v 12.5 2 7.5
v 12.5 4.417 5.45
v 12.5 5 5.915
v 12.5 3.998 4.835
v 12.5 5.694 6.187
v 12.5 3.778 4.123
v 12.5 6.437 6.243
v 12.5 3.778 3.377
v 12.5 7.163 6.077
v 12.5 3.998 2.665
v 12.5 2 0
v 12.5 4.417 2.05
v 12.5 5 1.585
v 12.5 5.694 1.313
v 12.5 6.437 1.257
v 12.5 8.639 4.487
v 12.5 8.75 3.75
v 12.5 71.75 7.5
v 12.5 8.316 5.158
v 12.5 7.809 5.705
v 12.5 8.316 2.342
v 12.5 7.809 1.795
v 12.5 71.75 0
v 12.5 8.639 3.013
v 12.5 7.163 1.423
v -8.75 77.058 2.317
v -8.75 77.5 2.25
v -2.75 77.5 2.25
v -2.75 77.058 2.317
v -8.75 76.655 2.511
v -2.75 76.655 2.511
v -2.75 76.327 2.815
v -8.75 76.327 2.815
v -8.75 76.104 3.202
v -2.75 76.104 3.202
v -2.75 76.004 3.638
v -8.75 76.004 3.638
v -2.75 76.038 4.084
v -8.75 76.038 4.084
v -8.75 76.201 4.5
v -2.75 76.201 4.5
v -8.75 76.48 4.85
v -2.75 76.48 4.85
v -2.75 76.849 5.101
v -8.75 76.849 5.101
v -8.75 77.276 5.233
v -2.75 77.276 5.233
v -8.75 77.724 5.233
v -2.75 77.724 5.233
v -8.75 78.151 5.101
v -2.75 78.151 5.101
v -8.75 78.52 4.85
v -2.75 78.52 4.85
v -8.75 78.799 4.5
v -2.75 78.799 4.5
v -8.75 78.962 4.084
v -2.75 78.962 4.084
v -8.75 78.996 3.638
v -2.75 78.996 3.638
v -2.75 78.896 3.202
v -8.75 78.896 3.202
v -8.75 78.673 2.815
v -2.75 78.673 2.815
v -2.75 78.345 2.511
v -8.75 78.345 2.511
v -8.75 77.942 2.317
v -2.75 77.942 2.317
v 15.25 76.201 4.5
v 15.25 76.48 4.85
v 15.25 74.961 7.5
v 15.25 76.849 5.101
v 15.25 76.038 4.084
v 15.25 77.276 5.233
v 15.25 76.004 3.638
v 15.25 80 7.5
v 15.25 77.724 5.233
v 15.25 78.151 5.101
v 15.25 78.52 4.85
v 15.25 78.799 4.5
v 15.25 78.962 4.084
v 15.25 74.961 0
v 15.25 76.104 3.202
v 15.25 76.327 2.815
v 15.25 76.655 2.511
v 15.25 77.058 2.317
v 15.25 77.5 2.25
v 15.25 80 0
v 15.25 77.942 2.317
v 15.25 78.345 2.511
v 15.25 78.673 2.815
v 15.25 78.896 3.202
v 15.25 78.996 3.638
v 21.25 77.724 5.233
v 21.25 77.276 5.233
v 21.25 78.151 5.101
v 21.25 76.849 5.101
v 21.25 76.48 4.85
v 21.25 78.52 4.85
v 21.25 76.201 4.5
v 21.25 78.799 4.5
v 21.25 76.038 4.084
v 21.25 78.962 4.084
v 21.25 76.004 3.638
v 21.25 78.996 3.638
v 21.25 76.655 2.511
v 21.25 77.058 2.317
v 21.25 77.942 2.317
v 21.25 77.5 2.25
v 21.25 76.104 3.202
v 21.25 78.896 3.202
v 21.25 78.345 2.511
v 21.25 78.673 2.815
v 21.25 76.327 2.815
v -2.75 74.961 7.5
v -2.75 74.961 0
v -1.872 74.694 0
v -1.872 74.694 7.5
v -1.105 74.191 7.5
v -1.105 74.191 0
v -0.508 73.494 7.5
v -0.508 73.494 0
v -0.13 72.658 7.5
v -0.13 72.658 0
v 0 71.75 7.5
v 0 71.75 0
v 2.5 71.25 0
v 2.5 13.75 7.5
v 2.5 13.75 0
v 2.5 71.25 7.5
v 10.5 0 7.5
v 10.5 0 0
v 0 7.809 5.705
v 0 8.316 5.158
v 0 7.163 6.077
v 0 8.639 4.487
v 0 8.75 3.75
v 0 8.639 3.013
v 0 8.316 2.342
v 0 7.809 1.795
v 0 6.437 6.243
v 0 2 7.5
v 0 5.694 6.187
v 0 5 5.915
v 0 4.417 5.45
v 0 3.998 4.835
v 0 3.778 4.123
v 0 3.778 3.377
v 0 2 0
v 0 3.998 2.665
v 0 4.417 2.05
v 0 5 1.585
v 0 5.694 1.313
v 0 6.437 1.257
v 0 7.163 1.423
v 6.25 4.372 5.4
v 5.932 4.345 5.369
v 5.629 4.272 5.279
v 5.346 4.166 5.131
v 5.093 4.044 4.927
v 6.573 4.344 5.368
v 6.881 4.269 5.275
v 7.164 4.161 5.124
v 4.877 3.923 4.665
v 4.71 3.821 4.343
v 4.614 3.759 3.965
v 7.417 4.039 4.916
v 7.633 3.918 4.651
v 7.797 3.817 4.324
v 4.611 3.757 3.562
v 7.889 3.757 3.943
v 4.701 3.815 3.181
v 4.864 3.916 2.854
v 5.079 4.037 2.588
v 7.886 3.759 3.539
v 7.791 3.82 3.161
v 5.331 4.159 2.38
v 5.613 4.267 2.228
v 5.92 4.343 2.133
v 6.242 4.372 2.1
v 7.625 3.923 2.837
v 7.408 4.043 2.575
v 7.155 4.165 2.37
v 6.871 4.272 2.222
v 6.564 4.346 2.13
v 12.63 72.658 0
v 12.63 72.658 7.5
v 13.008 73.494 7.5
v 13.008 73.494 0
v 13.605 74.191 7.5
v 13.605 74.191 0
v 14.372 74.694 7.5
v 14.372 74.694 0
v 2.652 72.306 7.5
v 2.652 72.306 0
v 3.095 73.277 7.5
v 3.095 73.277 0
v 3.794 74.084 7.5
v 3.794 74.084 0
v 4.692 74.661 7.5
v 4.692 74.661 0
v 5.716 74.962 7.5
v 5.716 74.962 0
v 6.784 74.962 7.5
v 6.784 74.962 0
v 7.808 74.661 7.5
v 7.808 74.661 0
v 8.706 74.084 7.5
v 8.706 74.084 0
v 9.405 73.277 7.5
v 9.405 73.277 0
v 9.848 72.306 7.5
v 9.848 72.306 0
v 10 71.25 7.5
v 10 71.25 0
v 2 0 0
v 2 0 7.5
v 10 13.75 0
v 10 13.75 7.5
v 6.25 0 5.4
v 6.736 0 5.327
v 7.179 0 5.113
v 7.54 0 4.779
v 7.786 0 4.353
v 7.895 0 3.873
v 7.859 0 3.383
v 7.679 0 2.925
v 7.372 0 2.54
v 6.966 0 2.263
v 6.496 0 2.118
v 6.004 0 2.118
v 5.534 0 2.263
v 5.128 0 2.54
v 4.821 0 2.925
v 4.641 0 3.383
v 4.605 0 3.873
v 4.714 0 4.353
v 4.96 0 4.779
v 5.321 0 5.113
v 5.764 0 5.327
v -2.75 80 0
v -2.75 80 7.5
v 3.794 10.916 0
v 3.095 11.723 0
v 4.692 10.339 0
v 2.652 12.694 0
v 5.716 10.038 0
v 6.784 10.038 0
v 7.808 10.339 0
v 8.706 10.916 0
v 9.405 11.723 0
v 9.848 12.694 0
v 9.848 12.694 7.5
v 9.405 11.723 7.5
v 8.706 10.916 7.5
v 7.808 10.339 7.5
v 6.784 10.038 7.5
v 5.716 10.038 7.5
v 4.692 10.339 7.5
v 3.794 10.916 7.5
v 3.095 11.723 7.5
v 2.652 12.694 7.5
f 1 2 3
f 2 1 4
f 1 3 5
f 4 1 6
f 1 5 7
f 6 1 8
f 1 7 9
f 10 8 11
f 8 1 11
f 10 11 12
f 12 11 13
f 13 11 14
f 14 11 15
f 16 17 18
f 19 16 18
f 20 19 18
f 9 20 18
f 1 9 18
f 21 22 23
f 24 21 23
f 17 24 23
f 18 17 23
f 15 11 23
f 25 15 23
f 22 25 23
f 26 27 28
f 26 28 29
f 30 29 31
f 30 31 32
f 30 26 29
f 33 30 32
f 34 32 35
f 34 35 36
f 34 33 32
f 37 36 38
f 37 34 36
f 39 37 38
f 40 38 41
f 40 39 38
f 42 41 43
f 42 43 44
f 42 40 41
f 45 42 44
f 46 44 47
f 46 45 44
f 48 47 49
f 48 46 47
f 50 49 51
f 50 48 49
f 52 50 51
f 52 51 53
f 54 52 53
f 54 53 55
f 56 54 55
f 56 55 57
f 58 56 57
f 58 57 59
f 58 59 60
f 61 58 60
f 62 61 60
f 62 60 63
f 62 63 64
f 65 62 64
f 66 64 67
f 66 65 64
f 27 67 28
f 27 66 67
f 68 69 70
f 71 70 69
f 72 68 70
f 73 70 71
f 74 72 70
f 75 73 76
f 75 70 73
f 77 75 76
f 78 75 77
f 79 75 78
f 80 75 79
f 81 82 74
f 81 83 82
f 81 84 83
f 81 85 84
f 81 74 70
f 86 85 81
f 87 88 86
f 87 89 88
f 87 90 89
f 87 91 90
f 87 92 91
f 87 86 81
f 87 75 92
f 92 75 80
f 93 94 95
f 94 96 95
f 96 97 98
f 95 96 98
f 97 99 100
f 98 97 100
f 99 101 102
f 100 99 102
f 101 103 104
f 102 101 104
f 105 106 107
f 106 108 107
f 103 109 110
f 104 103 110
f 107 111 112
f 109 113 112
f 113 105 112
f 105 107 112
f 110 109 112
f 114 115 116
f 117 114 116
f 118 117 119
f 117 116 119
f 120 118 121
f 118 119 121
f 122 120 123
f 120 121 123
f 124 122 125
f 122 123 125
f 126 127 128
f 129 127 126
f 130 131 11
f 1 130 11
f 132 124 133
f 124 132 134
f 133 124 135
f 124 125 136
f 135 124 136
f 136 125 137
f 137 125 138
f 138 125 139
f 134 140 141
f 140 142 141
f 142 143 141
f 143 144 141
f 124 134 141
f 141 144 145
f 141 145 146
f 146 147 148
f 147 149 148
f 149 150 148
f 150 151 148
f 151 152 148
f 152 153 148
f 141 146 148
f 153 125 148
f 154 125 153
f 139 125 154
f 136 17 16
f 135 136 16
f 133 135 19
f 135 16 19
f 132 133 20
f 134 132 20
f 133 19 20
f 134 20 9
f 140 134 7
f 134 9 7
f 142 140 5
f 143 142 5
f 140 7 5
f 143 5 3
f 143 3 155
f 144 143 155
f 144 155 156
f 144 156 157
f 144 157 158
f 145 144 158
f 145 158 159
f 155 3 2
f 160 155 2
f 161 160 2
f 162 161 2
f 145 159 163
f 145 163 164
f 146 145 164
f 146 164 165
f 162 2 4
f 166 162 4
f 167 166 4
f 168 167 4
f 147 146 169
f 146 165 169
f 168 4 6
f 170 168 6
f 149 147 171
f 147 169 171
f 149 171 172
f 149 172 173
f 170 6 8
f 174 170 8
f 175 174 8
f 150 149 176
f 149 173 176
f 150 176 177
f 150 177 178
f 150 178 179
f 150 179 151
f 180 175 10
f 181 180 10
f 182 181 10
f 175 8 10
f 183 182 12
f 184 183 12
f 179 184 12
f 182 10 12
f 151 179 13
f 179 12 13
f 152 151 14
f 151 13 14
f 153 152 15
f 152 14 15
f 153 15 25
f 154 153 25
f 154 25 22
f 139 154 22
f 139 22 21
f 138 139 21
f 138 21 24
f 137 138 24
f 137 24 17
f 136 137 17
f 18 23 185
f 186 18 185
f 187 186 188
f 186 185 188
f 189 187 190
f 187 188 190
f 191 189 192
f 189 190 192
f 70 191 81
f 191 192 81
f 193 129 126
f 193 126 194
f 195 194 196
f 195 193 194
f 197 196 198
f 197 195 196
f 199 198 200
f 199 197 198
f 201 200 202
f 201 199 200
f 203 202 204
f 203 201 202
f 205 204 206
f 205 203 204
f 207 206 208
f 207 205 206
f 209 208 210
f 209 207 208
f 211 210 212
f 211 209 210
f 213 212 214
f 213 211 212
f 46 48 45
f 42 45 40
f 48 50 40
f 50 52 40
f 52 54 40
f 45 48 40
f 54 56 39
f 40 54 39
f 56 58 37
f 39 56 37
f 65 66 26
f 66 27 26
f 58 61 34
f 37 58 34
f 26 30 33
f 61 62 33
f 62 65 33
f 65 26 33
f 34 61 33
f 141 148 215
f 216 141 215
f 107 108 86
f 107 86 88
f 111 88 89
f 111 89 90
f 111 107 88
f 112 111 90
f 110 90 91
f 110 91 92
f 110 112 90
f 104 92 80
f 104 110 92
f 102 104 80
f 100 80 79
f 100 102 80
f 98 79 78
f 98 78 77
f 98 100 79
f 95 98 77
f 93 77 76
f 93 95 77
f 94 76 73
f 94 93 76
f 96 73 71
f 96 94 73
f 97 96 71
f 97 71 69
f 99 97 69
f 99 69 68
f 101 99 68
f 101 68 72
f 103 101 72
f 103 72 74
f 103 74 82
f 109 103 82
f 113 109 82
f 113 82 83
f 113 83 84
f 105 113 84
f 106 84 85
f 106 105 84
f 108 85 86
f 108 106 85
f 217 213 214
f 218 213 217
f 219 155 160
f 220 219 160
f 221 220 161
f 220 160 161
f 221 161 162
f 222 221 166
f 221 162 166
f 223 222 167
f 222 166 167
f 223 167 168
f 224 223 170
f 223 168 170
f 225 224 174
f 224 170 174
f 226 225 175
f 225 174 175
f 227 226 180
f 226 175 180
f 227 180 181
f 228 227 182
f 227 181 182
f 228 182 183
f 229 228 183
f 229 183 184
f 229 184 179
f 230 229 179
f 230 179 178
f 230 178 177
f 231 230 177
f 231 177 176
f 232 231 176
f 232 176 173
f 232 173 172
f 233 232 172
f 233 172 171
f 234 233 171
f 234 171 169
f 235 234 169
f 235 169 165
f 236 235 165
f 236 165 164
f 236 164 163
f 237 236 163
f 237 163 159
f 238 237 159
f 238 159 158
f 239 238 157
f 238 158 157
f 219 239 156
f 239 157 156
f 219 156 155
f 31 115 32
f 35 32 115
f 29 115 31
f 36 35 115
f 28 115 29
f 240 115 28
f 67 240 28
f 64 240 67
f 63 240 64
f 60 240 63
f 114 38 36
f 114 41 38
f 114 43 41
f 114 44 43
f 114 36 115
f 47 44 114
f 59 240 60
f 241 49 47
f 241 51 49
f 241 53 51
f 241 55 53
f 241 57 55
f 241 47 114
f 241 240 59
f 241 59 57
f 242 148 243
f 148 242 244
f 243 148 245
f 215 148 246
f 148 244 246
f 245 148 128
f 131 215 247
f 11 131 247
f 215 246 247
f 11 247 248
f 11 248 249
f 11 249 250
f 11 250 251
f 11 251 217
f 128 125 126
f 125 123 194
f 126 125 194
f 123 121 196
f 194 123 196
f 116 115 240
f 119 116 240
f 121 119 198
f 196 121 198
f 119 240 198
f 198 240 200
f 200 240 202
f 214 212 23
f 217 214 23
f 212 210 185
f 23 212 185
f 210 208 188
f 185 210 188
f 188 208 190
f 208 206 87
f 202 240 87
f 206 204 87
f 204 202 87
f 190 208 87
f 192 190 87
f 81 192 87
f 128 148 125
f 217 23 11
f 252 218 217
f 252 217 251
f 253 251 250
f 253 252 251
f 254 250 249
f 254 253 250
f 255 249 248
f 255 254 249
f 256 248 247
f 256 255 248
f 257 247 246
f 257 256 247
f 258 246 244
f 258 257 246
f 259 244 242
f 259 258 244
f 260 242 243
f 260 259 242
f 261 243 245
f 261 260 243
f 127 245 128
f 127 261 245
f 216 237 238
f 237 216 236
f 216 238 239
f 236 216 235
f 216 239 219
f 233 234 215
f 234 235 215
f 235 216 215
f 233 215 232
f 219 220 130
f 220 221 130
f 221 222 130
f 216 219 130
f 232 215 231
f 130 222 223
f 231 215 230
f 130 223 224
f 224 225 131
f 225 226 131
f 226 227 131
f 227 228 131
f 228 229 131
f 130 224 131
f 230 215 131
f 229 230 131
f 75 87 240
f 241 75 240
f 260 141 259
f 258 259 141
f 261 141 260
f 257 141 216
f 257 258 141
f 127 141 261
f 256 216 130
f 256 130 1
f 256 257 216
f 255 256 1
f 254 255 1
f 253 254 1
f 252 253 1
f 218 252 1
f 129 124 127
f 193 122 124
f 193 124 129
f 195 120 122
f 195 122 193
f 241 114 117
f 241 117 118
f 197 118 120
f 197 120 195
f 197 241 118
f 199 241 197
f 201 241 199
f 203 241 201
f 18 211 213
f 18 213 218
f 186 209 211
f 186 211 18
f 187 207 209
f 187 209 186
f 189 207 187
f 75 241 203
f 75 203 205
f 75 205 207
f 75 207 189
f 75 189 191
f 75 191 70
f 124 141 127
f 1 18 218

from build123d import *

# Parameters (mm, degrees)
AUFSATZ_LINEAR_AUSTRAGEN1_DEPTH = 7.5
SCHNITT_LINEAR_AUSTRAGEN1_DEPTH = 10
SKIZZE7_R                       = 2.5
SCHNITT_LINEAR_AUSTRAGEN4_DEPTH = 84.113251049
M4_GEWINDEBOHRUNG1_D            = 3.3
M4_GEWINDEBOHRUNG1_DEPTH        = 7.5
M4_GEWINDEBOHRUNG1_TIP          = 0.991420021
SKIZZE9_OUTSIDE_W               = 26.654
SKIZZE9_OUTSIDE_H               = 99.154
SKIZZE9_OUTSIDE_R               = 1.5
SCHNITT_LINEAR_AUSTRAGEN5_DEPTH = 6
SKIZZE10_OUTSIDE_W              = 26.654
SKIZZE10_OUTSIDE_H              = 99.154
SKIZZE10_OUTSIDE_R              = 1.5
SCHNITT_LINEAR_AUSTRAGEN6_DEPTH = 6


with BuildPart() as part:
    # Skizze1 → Aufsatz-Linear austragen1 (new body)
    with BuildSketch(Plane.XY):
        with BuildLine():
            Line((-8.75, 75), (-3.25, 75))
            ThreePointArc((-3.25, 75), (-0.951902961, 74.048097039), (0, 71.75))
            Line((0, 71.75), (0, 2))
            Line((0, 2), (2, 0))
            Line((2, 0), (10.5, 0))
            Line((10.5, 0), (12.5, 2))
            Line((12.5, 2), (12.5, 71.75))
            ThreePointArc((12.5, 71.75), (13.451902961, 74.048097039), (15.75, 75))
            Line((15.75, 75), (21.25, 75))
            Line((21.25, 75), (21.25, 80))
            Line((21.25, 80), (-8.75, 80))
            Line((-8.75, 80), (-8.75, 75))
        make_face()
    extrude(amount=AUFSATZ_LINEAR_AUSTRAGEN1_DEPTH)

    # Skizze2 → Schnitt-Linear austragen1 (cut)
    with BuildSketch(Plane.XY.offset(7.5)):
        with BuildLine():
            Line((10, 71.25), (10, 13.75))
            ThreePointArc((10, 13.75), (6.25, 10), (2.5, 13.75))
            Line((2.5, 13.75), (2.5, 71.25))
            ThreePointArc((2.5, 71.25), (6.25, 75), (10, 71.25))
        make_face()
    extrude(amount=-SCHNITT_LINEAR_AUSTRAGEN1_DEPTH, mode=Mode.SUBTRACT)

    # Skizze7 → Schnitt-Linear austragen4 (cut, through all)
    with BuildSketch(Plane(origin=(12.5, 0, 0), x_dir=(0, 0, -1), z_dir=(1, 0, 0))):
        with Locations(Location((-3.75, 6.25, 0), (0, 0, 90))):
            Circle(SKIZZE7_R)
    extrude(amount=-SCHNITT_LINEAR_AUSTRAGEN4_DEPTH, mode=Mode.SUBTRACT)

    # M4 Gewindebohrung1
    with Locations(Plane(origin=(6.25, 0, 3.75), x_dir=(0, 0, -1), z_dir=(0, -1, 0))):
        with Locations((0, 0)):
            Hole(M4_GEWINDEBOHRUNG1_D / 2, depth=M4_GEWINDEBOHRUNG1_DEPTH)
            with Locations((0, 0, -(M4_GEWINDEBOHRUNG1_DEPTH + M4_GEWINDEBOHRUNG1_TIP / 2))):  # 118° drill point
                Cone(0, M4_GEWINDEBOHRUNG1_D / 2, M4_GEWINDEBOHRUNG1_TIP, mode=Mode.SUBTRACT)

    # Skizze9 outside → Schnitt-Linear austragen5 (cut)
    with BuildSketch(Plane(origin=(21.25, 0, 0), x_dir=(0, 0, -1), z_dir=(1, 0, 0))):
        with Locations((-3.75, 40)):
            Rectangle(SKIZZE9_OUTSIDE_W, SKIZZE9_OUTSIDE_H)
        with Locations((-3.75, 77.5)):
            Circle(SKIZZE9_OUTSIDE_R, mode=Mode.SUBTRACT)
    extrude(amount=-SCHNITT_LINEAR_AUSTRAGEN5_DEPTH, mode=Mode.SUBTRACT)

    # Skizze10 outside → Schnitt-Linear austragen6 (cut)
    with BuildSketch(Plane.ZY.offset(8.75)):
        with Locations((3.75, 40)):
            Rectangle(SKIZZE10_OUTSIDE_W, SKIZZE10_OUTSIDE_H)
        with Locations(Location((3.75, 77.5, 0), (0, 0, 180))):
            Circle(SKIZZE10_OUTSIDE_R, mode=Mode.SUBTRACT)
    extrude(amount=-SCHNITT_LINEAR_AUSTRAGEN6_DEPTH, mode=Mode.SUBTRACT)


solid = part.part
